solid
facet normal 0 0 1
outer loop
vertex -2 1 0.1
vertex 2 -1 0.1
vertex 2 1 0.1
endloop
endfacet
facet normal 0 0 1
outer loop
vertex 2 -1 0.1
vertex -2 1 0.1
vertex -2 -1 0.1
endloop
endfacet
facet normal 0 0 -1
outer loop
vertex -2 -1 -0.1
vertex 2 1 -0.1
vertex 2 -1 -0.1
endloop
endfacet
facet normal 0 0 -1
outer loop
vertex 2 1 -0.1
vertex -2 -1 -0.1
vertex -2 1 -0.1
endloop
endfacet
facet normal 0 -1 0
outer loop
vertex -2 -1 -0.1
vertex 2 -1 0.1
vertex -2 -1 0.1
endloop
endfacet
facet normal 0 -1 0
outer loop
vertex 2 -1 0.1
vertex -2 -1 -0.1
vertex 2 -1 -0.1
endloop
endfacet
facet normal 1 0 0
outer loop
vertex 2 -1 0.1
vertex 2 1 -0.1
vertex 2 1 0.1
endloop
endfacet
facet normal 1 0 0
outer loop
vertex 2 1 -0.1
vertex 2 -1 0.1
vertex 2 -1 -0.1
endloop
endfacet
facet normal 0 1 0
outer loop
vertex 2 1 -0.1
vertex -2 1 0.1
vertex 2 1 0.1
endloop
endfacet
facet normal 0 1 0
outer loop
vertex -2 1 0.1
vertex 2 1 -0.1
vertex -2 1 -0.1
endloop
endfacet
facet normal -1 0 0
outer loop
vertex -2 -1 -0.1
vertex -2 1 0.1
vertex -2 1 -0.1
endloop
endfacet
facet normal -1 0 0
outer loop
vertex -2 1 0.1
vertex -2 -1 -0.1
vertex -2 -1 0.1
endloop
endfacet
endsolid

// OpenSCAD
module Street_01(col ="#3b4747"){
    color(col)
    cube([4,2,0.2], center = true);

}

Street_01();


// Written by Nicolì Angelo (Gengio) 2024: 
// MIT License

//Permission is hereby granted, free of charge, to any person obtaining a copy of this software and associated documentation files (the "Software"), to deal in the Software without restriction, including without limitation the rights to use, copy, modify, merge, publish, distribute, sublicense, and/or sell copies of the Software, and to permit persons to whom the Software is furnished to do so, subject to the following conditions:

//The above copyright notice and this permission notice shall be included in all copies or substantial portions of the Software.

//THE SOFTWARE IS PROVIDED "AS IS", WITHOUT WARRANTY OF ANY KIND, EXPRESS OR IMPLIED, INCLUDING BUT NOT LIMITED TO THE WARRANTIES OF MERCHANTABILITY, FITNESS FOR A PARTICULAR PURPOSE AND NONINFRINGEMENT. IN NO EVENT SHALL THE AUTHORS OR COPYRIGHT HOLDERS BE LIABLE FOR ANY CLAIM, DAMAGES OR OTHER LIABILITY, WHETHER IN AN ACTION OF CONTRACT, TORT OR OTHERWISE, ARISING FROM, OUT OF OR IN CONNECTION WITH THE SOFTWARE OR THE USE OR OTHER DEALINGS IN THE SOFTWARE.
